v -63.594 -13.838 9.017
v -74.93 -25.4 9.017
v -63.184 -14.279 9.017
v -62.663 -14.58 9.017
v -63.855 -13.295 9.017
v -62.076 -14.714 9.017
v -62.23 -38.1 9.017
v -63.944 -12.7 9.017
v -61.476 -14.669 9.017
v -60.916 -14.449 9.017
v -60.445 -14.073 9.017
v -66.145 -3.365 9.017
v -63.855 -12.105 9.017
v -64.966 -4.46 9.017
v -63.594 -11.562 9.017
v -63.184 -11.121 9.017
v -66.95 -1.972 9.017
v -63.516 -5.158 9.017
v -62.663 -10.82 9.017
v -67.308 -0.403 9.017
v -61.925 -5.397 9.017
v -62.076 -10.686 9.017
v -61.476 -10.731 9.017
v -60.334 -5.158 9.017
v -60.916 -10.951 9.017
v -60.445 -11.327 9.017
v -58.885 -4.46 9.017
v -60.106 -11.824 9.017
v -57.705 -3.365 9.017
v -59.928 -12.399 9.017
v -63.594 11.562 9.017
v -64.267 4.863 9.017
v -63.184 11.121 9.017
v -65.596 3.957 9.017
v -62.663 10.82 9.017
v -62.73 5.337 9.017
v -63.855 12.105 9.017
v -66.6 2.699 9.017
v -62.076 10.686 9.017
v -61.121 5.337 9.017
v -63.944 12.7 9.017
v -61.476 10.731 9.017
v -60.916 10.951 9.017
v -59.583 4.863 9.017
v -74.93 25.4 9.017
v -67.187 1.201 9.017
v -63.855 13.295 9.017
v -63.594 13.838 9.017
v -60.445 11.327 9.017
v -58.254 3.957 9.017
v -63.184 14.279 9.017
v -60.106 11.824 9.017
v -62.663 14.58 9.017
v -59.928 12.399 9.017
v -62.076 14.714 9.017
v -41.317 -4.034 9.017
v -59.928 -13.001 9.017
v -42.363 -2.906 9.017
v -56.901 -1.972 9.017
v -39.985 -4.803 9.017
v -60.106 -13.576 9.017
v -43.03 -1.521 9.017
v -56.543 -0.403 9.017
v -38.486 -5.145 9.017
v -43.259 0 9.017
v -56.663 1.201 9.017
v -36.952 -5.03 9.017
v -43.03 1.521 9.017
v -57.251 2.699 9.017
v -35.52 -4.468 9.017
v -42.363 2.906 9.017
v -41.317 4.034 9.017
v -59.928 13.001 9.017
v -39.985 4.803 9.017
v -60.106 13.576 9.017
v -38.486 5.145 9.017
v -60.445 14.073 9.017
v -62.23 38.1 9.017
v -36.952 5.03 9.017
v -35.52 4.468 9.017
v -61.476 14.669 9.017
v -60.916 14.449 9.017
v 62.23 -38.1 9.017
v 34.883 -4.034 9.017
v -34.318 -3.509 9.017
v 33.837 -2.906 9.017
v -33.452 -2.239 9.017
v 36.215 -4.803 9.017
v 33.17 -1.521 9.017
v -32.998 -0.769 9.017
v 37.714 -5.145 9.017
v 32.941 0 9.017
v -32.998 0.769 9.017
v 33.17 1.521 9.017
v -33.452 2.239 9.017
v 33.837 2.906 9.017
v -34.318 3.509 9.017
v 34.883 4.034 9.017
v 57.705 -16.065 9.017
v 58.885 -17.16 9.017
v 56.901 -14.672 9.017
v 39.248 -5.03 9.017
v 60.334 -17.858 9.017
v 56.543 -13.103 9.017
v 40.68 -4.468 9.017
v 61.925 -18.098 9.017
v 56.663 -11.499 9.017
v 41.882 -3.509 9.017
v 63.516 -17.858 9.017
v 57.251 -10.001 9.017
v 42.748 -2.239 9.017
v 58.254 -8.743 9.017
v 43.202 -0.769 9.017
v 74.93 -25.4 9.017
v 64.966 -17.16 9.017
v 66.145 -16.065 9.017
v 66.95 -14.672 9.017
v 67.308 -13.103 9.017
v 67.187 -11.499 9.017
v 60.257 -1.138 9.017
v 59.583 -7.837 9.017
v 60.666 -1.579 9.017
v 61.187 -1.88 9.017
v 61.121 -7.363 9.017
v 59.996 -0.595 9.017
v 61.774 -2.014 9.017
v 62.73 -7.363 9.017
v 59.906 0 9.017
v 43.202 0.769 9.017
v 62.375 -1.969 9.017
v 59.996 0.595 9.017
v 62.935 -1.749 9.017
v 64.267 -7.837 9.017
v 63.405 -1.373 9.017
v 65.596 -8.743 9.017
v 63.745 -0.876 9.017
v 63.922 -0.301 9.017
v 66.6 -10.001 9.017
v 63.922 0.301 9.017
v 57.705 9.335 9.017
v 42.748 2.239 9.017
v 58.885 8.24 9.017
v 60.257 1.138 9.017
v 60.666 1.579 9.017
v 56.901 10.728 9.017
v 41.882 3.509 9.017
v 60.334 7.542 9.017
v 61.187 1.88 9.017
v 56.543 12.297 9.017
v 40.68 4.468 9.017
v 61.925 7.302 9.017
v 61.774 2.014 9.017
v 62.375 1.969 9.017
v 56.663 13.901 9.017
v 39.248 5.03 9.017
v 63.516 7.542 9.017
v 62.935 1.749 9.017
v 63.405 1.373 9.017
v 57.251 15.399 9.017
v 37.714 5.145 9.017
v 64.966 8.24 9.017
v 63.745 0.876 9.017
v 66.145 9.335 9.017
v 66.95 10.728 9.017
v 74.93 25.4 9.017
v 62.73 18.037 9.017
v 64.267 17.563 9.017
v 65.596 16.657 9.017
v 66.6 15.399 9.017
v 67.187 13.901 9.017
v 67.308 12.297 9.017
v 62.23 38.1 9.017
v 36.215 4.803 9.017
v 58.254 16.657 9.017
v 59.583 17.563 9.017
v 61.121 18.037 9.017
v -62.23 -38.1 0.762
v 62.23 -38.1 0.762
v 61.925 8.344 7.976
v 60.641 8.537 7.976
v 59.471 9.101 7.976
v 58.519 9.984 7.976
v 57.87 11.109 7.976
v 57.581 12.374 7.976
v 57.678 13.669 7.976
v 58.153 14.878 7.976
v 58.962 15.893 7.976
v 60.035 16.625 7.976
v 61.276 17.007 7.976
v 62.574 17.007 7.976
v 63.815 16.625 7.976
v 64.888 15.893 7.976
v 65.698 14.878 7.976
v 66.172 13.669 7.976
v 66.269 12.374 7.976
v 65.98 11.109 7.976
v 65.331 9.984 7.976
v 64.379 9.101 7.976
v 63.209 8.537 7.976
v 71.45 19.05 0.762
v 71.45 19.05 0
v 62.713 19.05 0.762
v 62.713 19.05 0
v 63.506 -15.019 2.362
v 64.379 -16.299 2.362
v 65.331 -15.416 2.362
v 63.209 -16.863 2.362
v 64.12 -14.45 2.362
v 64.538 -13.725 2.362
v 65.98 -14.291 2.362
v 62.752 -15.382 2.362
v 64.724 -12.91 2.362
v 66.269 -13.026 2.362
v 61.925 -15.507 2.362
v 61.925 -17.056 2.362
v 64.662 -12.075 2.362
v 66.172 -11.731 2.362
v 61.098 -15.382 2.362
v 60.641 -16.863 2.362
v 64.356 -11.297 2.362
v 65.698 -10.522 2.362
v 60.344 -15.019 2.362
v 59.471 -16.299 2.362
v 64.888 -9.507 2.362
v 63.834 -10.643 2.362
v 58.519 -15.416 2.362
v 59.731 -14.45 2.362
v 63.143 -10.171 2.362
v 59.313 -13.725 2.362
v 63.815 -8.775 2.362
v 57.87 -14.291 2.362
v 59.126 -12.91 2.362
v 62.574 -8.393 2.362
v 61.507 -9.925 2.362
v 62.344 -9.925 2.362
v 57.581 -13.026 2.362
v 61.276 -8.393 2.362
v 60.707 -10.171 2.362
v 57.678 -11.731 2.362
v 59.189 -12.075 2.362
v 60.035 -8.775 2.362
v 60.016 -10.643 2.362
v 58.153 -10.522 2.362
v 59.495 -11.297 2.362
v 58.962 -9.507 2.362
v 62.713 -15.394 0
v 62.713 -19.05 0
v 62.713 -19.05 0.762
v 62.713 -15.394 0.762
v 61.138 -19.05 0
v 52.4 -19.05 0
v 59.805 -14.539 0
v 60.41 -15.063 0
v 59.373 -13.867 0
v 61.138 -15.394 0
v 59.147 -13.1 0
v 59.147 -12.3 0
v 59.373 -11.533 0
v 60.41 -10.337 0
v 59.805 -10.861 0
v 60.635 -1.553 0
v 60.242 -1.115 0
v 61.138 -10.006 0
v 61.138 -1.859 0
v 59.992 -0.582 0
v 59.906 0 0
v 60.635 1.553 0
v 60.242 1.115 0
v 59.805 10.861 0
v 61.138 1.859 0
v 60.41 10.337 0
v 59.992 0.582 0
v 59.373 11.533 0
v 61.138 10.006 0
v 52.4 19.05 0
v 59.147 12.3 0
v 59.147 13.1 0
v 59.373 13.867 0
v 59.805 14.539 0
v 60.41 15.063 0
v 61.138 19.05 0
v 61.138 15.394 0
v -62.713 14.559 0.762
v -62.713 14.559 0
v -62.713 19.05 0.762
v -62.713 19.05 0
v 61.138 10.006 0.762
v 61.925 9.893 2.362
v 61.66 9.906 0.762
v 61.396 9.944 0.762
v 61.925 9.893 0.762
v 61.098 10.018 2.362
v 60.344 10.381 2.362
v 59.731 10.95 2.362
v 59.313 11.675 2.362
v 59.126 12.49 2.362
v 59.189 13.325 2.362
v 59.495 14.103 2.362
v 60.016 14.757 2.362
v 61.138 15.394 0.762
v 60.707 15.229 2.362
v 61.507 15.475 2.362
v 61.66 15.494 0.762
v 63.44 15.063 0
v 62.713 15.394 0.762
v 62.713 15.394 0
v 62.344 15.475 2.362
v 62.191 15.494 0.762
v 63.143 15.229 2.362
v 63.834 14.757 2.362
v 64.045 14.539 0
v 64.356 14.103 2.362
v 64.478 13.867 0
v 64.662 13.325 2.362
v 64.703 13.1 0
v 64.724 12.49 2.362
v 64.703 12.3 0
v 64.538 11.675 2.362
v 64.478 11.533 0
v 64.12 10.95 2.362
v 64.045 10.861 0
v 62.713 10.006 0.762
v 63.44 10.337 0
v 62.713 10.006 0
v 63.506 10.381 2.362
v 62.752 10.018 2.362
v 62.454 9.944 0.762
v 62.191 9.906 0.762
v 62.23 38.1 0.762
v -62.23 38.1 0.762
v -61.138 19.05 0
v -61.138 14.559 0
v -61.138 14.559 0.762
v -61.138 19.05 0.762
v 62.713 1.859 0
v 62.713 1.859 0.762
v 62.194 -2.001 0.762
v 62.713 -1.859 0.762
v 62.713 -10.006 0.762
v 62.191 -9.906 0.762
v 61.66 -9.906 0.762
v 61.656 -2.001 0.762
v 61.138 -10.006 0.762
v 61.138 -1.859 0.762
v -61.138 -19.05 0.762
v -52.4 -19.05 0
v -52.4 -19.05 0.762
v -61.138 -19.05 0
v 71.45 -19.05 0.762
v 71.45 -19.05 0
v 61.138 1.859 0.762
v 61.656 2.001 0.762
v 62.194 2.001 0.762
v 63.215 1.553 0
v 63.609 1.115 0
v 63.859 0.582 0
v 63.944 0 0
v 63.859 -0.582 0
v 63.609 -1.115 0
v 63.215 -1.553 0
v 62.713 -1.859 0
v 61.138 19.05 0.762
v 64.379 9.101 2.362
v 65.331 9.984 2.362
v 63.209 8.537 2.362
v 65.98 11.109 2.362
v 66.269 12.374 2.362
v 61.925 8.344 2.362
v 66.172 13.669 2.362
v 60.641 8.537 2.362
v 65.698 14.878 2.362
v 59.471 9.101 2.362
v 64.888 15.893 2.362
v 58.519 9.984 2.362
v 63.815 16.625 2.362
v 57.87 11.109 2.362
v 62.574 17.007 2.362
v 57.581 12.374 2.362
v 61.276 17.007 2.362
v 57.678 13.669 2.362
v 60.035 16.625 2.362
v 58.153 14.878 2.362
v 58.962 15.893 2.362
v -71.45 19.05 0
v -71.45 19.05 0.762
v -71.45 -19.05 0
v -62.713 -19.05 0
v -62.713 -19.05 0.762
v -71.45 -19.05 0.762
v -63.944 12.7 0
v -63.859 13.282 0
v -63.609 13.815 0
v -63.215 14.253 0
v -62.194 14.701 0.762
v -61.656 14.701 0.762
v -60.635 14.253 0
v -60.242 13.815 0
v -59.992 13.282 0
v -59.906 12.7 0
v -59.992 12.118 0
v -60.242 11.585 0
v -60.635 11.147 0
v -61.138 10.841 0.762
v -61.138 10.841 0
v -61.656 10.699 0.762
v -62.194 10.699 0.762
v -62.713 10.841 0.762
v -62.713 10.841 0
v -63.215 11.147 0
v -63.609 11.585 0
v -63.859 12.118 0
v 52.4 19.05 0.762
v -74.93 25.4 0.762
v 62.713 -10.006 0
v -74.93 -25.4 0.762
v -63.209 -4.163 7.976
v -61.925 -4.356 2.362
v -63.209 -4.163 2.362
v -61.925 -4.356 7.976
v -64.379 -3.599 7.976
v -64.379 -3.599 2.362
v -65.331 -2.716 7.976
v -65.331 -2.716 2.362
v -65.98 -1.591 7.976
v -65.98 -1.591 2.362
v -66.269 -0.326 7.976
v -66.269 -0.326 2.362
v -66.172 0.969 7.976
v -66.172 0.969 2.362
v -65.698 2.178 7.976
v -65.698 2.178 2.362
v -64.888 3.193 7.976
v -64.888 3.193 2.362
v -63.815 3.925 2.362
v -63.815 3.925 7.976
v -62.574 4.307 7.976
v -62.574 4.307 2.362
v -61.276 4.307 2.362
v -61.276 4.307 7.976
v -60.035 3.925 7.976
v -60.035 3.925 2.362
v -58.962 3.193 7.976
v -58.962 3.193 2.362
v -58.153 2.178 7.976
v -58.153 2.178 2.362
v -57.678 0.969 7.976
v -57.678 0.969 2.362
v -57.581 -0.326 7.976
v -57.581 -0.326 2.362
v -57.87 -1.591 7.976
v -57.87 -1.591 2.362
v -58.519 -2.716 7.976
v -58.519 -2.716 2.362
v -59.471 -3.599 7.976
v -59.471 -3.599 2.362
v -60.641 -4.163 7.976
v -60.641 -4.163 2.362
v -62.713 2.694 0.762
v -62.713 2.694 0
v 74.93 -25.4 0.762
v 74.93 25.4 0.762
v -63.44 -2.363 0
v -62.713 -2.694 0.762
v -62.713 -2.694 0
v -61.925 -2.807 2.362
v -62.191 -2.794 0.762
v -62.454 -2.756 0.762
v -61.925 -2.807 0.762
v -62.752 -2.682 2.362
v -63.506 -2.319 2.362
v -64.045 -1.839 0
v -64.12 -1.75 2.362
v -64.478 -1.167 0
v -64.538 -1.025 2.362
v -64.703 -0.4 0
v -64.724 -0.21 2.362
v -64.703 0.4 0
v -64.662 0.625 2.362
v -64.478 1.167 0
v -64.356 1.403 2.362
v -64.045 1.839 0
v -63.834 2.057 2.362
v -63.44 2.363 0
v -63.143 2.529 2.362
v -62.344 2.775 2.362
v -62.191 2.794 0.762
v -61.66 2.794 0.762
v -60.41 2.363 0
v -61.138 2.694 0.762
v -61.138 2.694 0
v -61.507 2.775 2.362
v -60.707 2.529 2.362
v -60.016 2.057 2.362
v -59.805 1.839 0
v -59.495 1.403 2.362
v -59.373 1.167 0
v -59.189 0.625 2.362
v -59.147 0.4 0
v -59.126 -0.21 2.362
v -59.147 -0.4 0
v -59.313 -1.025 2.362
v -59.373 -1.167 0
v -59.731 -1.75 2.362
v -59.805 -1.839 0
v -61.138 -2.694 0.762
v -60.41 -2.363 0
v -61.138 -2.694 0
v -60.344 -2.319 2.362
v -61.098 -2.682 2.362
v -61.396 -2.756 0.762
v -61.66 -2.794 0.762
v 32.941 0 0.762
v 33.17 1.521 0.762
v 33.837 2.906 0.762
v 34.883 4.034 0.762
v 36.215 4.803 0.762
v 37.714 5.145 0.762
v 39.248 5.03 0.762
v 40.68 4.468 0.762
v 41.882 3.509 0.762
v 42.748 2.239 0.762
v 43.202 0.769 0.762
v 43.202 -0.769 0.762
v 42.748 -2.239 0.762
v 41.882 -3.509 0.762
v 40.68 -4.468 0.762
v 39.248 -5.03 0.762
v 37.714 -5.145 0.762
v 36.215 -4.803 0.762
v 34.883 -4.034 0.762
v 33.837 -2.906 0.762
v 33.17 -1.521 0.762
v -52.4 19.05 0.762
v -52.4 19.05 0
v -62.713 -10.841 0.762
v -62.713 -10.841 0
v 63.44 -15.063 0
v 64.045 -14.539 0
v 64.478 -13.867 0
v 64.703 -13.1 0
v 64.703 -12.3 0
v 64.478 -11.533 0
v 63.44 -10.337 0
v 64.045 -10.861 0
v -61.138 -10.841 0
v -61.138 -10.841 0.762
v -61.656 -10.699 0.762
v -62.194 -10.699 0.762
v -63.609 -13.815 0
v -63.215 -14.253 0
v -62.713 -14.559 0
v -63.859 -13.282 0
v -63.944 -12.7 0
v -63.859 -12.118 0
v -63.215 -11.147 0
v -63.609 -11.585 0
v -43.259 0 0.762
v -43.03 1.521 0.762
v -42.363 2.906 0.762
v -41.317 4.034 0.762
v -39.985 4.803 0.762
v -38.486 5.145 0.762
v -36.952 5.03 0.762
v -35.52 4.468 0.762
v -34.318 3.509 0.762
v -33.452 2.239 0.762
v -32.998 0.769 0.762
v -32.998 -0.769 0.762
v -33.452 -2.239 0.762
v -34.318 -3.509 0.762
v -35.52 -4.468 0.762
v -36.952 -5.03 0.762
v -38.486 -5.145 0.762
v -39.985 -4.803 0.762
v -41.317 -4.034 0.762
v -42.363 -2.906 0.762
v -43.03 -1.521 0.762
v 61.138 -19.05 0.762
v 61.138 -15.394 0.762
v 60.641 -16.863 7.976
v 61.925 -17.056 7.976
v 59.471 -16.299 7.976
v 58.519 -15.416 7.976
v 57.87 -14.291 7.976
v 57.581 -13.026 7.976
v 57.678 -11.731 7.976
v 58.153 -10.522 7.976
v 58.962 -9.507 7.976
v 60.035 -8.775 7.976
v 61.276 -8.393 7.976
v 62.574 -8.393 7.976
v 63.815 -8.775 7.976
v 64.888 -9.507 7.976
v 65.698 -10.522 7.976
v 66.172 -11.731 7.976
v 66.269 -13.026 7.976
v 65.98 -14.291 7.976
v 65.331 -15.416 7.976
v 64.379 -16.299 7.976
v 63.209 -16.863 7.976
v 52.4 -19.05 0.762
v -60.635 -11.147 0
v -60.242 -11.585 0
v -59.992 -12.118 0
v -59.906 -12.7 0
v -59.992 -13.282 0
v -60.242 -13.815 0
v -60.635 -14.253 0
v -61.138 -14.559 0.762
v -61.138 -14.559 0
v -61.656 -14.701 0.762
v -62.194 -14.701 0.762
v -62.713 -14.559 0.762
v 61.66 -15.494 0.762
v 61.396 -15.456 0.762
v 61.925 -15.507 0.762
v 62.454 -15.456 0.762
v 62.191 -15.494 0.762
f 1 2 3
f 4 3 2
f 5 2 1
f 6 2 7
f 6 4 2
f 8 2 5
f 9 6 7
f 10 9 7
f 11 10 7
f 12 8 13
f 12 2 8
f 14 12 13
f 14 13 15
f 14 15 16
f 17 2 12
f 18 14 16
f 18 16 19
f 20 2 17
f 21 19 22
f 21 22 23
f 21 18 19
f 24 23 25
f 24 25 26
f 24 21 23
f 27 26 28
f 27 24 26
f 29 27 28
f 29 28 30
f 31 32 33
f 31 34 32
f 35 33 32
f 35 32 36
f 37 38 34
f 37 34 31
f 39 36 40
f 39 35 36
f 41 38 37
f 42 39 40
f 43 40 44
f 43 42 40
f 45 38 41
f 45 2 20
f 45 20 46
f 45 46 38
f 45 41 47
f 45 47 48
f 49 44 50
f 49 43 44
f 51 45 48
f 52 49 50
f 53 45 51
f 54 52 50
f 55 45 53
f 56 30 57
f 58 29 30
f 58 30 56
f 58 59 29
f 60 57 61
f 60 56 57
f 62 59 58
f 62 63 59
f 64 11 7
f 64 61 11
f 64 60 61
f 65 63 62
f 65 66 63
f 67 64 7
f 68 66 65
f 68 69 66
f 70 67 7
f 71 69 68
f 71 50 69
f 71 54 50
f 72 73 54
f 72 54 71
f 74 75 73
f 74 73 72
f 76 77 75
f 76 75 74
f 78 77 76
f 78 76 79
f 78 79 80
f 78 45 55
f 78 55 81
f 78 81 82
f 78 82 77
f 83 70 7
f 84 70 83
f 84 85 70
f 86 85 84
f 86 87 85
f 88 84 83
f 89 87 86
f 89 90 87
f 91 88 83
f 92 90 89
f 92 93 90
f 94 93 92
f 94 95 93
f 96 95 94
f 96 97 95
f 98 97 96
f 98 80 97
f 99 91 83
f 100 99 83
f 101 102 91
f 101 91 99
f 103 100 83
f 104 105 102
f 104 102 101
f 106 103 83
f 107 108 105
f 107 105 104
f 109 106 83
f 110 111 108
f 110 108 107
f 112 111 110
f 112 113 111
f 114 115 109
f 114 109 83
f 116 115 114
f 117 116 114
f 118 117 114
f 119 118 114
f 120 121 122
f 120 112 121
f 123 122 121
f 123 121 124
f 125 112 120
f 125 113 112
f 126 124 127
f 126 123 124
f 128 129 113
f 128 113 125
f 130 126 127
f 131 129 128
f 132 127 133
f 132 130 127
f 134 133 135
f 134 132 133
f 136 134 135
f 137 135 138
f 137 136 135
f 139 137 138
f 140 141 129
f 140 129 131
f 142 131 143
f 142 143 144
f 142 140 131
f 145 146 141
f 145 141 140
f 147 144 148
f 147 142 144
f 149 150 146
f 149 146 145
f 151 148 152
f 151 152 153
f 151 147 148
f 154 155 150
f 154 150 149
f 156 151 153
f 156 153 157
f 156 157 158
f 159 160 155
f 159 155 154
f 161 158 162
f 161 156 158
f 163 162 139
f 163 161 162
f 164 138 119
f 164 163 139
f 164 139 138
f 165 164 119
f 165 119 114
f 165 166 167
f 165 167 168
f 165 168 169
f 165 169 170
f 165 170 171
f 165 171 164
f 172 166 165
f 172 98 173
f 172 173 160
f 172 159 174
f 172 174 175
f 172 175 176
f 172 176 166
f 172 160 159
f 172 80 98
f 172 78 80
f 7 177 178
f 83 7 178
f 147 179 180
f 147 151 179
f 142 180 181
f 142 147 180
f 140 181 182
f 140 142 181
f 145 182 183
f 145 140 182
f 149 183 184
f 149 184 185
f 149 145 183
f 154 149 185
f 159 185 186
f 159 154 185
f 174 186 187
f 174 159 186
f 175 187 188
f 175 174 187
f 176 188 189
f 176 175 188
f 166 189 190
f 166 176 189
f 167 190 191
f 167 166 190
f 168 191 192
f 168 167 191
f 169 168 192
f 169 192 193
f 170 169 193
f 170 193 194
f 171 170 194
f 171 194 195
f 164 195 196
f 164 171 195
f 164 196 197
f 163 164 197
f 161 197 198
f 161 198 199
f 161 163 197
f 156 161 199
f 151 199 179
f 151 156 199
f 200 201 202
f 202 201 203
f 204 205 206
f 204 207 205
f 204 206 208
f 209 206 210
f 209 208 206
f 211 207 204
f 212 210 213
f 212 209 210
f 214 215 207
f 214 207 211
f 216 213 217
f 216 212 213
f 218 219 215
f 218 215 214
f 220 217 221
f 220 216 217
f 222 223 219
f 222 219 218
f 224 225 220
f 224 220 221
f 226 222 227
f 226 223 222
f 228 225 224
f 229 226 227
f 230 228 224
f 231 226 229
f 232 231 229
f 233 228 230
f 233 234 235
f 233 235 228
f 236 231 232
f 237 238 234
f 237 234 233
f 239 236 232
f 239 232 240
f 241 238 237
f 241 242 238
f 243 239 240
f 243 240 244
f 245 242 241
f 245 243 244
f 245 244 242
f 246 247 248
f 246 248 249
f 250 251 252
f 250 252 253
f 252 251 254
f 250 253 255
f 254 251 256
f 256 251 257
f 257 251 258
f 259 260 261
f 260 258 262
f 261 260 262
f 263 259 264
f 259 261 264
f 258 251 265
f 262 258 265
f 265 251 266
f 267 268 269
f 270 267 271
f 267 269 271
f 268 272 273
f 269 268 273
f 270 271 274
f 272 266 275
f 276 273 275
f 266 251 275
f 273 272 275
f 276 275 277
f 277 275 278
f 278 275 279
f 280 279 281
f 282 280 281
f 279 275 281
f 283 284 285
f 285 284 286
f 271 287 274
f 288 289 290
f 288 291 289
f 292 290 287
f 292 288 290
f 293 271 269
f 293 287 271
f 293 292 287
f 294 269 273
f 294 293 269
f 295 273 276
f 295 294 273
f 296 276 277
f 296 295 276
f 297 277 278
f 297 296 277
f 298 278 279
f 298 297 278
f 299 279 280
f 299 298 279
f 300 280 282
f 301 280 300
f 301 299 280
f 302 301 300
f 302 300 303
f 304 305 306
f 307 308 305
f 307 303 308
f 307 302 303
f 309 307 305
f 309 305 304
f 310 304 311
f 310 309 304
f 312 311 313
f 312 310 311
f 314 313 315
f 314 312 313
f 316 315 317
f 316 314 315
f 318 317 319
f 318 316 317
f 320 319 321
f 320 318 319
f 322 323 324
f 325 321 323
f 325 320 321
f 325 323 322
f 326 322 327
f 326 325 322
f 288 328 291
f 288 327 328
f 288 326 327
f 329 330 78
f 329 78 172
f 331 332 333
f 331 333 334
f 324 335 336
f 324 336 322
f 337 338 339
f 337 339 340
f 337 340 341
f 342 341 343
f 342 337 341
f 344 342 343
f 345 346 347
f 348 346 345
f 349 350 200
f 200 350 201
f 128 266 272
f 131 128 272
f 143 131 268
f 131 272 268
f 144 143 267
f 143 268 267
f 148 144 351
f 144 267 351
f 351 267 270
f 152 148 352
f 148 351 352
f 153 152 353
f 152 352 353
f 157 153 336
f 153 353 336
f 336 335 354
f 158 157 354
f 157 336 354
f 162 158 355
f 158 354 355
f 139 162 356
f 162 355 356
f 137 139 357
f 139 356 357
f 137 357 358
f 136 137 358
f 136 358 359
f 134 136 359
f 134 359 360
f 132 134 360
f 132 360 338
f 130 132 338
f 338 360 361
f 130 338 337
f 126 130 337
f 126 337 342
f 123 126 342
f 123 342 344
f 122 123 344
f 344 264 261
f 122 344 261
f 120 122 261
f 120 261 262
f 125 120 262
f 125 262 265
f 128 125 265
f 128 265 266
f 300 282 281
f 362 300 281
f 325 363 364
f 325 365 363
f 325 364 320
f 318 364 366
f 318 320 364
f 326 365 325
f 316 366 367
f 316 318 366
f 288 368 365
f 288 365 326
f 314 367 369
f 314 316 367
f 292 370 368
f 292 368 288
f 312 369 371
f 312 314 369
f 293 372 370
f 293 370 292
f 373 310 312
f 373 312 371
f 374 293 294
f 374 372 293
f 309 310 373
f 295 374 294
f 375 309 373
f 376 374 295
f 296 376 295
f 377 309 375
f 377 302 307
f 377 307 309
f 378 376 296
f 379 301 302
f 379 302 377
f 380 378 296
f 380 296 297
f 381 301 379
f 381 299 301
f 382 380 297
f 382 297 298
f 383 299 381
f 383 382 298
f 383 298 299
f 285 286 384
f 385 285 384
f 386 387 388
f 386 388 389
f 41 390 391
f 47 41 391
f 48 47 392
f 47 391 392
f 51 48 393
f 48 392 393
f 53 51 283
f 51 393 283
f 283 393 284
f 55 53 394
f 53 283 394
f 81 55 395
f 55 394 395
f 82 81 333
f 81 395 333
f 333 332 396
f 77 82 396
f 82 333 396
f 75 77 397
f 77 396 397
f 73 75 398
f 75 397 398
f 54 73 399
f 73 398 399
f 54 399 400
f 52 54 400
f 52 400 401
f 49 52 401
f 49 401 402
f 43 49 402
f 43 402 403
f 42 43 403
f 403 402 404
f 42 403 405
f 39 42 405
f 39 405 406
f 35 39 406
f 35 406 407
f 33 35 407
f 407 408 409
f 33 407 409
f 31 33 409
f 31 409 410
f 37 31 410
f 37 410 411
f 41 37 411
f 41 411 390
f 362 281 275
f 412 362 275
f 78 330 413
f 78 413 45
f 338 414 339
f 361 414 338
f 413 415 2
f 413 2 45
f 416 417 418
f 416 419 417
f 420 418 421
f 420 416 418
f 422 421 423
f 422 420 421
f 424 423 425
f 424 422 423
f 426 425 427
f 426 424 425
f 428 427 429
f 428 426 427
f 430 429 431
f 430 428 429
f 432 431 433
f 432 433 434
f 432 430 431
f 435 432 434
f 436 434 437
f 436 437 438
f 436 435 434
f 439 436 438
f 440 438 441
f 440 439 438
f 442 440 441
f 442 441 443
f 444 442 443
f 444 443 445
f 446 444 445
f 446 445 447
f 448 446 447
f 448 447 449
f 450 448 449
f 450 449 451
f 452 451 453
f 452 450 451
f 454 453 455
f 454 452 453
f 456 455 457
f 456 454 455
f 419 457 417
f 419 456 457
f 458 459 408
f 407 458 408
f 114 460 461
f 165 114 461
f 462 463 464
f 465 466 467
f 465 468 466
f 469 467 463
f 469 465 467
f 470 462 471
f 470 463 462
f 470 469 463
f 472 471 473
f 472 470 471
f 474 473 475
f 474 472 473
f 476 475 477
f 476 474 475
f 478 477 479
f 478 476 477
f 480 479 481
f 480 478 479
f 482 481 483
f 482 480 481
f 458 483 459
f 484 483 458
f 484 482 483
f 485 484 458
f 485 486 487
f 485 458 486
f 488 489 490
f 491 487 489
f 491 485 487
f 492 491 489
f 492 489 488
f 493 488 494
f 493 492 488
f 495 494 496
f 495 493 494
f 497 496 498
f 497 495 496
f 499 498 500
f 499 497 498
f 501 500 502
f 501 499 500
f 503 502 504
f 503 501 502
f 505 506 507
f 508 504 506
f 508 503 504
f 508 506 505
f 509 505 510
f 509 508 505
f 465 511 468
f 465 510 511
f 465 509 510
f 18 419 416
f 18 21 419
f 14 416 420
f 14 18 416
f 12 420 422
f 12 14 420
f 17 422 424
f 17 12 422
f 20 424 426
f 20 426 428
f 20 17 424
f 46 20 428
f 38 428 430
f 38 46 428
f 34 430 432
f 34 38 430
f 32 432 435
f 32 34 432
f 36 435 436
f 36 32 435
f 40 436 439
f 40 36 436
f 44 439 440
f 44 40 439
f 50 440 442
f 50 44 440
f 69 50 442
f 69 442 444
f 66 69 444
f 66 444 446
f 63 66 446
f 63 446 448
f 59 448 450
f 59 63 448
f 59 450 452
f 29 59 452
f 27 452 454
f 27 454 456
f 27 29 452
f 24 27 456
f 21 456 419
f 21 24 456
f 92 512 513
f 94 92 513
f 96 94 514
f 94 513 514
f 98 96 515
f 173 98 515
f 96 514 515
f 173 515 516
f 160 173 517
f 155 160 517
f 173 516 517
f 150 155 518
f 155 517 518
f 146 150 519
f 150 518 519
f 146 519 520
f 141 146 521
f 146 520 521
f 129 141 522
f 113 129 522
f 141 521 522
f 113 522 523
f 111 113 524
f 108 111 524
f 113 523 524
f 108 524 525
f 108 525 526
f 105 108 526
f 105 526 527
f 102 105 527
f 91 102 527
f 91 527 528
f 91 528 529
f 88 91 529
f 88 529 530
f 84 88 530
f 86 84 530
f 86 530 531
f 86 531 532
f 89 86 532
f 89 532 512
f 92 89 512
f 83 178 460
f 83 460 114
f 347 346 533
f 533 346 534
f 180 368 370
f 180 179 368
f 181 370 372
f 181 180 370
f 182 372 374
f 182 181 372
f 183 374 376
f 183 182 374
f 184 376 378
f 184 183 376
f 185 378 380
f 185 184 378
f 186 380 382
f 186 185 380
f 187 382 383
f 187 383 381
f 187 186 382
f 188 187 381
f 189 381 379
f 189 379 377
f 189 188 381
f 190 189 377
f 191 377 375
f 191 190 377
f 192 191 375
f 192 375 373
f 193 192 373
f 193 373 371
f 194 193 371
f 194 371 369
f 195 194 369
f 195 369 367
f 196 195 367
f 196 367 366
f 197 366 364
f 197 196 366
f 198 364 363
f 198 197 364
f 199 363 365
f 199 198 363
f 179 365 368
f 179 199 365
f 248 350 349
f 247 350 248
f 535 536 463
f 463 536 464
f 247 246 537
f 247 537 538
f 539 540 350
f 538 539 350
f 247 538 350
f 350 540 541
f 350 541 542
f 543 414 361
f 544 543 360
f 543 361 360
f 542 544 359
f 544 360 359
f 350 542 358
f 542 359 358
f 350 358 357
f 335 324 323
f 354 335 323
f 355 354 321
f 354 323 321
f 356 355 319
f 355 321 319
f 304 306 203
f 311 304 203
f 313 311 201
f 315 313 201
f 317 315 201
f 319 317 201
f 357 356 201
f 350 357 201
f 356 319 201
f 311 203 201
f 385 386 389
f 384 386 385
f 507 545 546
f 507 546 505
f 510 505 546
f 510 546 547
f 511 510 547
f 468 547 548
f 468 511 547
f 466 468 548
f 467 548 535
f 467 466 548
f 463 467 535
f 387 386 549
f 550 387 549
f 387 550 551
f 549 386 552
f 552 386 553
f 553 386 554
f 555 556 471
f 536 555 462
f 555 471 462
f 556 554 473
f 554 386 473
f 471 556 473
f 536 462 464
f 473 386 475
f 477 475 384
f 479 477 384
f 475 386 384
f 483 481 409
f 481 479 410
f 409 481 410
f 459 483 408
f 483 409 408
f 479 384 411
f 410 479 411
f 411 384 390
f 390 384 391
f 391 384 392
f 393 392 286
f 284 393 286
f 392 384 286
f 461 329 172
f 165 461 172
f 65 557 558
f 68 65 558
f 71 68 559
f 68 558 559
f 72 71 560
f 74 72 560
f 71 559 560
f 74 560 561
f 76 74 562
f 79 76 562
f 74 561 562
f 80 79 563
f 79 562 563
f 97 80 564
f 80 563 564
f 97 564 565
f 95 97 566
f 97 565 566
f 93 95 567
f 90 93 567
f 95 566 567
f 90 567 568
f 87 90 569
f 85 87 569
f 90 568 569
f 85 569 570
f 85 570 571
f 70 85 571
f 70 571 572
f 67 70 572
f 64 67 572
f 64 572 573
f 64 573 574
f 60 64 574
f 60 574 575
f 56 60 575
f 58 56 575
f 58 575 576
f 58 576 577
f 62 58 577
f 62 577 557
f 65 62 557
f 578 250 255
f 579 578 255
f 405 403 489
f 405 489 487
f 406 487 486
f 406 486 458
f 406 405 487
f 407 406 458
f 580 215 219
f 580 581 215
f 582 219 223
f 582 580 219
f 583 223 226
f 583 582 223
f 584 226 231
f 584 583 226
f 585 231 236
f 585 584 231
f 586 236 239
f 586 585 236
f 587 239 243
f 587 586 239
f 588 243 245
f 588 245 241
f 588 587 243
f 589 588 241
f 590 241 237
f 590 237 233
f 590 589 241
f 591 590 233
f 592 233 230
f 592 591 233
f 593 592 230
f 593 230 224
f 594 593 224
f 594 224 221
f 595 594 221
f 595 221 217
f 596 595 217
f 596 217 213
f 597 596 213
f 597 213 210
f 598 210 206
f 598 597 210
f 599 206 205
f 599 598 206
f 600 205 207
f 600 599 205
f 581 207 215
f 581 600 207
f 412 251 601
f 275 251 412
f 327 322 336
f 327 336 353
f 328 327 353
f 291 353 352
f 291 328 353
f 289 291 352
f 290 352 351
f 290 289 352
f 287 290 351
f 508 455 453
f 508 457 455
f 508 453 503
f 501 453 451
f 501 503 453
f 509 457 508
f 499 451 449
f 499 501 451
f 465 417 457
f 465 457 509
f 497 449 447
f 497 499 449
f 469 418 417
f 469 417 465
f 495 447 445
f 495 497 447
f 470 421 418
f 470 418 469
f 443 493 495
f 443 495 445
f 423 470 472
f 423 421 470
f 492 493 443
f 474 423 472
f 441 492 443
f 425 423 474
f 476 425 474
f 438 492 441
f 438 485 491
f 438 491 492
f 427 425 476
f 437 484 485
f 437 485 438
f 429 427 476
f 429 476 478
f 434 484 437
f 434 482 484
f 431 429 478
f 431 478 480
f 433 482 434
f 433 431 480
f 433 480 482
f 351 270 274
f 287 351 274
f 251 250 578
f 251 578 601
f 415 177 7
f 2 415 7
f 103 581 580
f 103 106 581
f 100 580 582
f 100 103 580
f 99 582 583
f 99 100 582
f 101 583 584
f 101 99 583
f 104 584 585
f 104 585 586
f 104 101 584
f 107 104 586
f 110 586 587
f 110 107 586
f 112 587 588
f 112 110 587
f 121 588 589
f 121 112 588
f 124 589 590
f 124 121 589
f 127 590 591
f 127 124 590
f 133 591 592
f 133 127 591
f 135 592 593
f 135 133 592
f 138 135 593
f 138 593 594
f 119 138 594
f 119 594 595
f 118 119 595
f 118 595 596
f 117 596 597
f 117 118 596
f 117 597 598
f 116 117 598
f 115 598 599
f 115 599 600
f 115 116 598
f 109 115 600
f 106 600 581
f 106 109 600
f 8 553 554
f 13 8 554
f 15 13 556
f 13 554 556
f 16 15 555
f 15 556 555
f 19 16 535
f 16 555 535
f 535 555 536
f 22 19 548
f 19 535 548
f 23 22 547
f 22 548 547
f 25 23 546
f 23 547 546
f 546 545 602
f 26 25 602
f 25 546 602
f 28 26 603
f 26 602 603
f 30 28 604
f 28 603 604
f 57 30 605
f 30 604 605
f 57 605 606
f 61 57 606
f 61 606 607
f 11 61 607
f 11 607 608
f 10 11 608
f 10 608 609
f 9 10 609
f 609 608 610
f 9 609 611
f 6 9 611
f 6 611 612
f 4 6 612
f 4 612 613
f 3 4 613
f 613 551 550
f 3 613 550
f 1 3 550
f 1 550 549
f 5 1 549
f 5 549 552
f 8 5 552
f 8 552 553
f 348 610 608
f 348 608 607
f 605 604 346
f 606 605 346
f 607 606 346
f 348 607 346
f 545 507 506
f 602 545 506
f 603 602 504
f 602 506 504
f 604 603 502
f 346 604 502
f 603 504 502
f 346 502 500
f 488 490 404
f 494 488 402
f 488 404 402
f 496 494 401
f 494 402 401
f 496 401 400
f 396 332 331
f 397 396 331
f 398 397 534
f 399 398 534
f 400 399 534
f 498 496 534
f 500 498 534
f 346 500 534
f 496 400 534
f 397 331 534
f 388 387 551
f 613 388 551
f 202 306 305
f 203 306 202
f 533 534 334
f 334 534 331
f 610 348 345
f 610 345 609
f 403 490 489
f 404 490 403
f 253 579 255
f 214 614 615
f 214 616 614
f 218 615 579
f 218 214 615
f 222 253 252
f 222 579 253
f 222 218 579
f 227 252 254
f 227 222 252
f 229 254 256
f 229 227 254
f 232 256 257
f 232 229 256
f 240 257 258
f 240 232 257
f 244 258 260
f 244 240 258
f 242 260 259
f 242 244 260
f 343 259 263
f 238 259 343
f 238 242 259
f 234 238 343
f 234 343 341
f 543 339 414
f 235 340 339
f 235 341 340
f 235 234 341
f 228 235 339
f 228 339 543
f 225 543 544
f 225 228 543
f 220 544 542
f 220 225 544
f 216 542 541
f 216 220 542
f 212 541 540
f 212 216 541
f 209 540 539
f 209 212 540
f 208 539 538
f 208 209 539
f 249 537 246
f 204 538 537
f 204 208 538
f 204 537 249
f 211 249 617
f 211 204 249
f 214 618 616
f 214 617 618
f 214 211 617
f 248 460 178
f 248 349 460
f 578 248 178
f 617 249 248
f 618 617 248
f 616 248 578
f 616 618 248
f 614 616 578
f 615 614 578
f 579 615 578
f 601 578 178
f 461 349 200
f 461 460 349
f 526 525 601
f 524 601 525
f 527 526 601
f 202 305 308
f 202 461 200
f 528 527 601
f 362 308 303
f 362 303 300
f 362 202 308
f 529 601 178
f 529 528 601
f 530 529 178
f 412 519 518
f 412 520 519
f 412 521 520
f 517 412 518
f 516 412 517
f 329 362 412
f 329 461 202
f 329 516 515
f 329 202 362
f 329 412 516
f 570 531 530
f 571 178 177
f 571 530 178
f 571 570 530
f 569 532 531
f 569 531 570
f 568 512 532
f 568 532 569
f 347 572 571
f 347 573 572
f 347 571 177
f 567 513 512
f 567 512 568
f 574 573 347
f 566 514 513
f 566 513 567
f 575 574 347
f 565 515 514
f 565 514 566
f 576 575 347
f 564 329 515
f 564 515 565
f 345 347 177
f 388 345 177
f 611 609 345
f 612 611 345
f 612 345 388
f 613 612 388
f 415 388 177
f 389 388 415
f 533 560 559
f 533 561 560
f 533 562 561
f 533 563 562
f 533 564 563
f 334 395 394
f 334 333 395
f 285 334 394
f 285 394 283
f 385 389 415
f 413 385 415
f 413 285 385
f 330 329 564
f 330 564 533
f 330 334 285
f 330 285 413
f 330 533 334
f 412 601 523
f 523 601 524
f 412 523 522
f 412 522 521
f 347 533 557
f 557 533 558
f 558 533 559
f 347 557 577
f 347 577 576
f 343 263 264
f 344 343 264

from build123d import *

# Parameters (mm, degrees)
SKETCH1_W                                    = 149.86
SKETCH1_H                                    = 76.2
EXTRUDE1_DEPTH                               = 9.017
SKETCH2_W                                    = 149.86
SKETCH2_H                                    = 76.2
SKETCH2_W_2                                  = 19.05
SKETCH2_H_2                                  = 38.1
CUT_EXTRUDE1_DEPTH                           = 0.762
F_10_32_TAPPED_HOLE1_D                       = 4.0386
CBORE_FOR_10_SOCKET_HEAD_CAP_SCREW1_AT_COUNT = 2
CBORE_FOR_10_SOCKET_HEAD_CAP_SCREW1_AT_PITCH = 124.499845703
CBORE_FOR_10_SOCKET_HEAD_CAP_SCREW1_2_COUNT  = 2
CBORE_FOR_10_SOCKET_HEAD_CAP_SCREW1_2_PITCH  = 25.4
CHAMFER1_SIZE                                = 12.7
SKETCH7_W                                    = 1.5748
SKETCH7_H                                    = 38.1
CUT_EXTRUDE2_DEPTH                           = 0.762
F_13_32_0_40625_DIAMETER_HOLE1_D             = 10.31875


with BuildPart() as part:
    # Sketch1 → Extrude1 (new body)
    with BuildSketch(Plane.XY):
        Rectangle(SKETCH1_W, SKETCH1_H)
    extrude(amount=EXTRUDE1_DEPTH)

    # Sketch2 → Cut-Extrude1 (cut)
    with BuildSketch(Plane(origin=(0, 0, 0), x_dir=(-1, 0, 0), z_dir=(0, 0, -1))):
        Rectangle(SKETCH2_W, SKETCH2_H)
        with Locations((-61.9252, 0)):
            Rectangle(SKETCH2_W_2, SKETCH2_H_2, mode=Mode.SUBTRACT)
        with Locations((61.9252, 0)):
            Rectangle(SKETCH2_W_2, SKETCH2_H_2, mode=Mode.SUBTRACT)
    extrude(amount=-CUT_EXTRUDE1_DEPTH, mode=Mode.SUBTRACT)

    # #10-32 Tapped Hole1 (through all)
    with Locations(Plane.XY.offset(9.017)):
        with Locations((61.9252, 0), (-61.9252, -12.7), (-61.9252, 12.7)):
            Hole(F_10_32_TAPPED_HOLE1_D / 2)

    # Sketch5 → CBORE for #10 Socket Head Cap Screw1 (revolve, cut)
    with BuildSketch(Plane(origin=(61.9252, -12.7, 9.017), x_dir=(0, -1, 0), z_dir=(1, 0, 0))):
        Polygon((0, 0), (0, 9.017), (2.8067, 9.017), (2.8067, 6.6548), (4.3561, 6.6548), (4.3561, 1.0414), (5.3975, 0), align=None)
    cbore_for_10_socket_head_cap_screw1 = revolve(axis=Axis((61.9252, -12.7, 15.367), (0, 0, -1)), mode=Mode.SUBTRACT)

    # CBORE for #10 Socket Head Cap Screw1 at: CBORE for #10 Socket Head Cap Screw1 ×2
    with Locations(*[Vector(-0.994783562, 0.102008159, 0) * (i * CBORE_FOR_10_SOCKET_HEAD_CAP_SCREW1_AT_PITCH) for i in range(1, CBORE_FOR_10_SOCKET_HEAD_CAP_SCREW1_AT_COUNT)]):
        add(cbore_for_10_socket_head_cap_screw1, mode=Mode.SUBTRACT)

    # CBORE for _10 Socket Head Cap Screw1 2: CBORE for #10 Socket Head Cap Screw1 ×2
    with Locations(*[(0, i * CBORE_FOR_10_SOCKET_HEAD_CAP_SCREW1_2_PITCH, 0) for i in range(1, CBORE_FOR_10_SOCKET_HEAD_CAP_SCREW1_2_COUNT)]):
        add(cbore_for_10_socket_head_cap_screw1, mode=Mode.SUBTRACT)

    # Chamfer1
    chamfer1_edges = [part.edges().sort_by_distance(p)[0] for p in [
        (74.93, -38.1, 4.8895),
        (-74.93, -38.1, 4.8895),
        (-74.93, 38.1, 4.8895),
        (74.93, 38.1, 4.8895),
    ]]
    chamfer(chamfer1_edges, length=CHAMFER1_SIZE)

    # Sketch7 → Cut-Extrude2 (cut)
    with BuildSketch(Plane(origin=(0, 0, 0), x_dir=(-1, 0, 0), z_dir=(0, 0, -1))):
        with Locations((61.9252, 0)):
            Rectangle(SKETCH7_W, SKETCH7_H)
        with Locations((-61.9252, 0)):
            Rectangle(SKETCH7_W, SKETCH7_H)
    extrude(amount=-CUT_EXTRUDE2_DEPTH, mode=Mode.SUBTRACT)

    # 13/32 (0.40625) Diameter Hole1 (through all)
    with Locations(Plane.XY.offset(9.017)):
        with Locations((38.1, 0), (-38.1, 0)):
            Hole(F_13_32_0_40625_DIAMETER_HOLE1_D / 2)


solid = part.part
